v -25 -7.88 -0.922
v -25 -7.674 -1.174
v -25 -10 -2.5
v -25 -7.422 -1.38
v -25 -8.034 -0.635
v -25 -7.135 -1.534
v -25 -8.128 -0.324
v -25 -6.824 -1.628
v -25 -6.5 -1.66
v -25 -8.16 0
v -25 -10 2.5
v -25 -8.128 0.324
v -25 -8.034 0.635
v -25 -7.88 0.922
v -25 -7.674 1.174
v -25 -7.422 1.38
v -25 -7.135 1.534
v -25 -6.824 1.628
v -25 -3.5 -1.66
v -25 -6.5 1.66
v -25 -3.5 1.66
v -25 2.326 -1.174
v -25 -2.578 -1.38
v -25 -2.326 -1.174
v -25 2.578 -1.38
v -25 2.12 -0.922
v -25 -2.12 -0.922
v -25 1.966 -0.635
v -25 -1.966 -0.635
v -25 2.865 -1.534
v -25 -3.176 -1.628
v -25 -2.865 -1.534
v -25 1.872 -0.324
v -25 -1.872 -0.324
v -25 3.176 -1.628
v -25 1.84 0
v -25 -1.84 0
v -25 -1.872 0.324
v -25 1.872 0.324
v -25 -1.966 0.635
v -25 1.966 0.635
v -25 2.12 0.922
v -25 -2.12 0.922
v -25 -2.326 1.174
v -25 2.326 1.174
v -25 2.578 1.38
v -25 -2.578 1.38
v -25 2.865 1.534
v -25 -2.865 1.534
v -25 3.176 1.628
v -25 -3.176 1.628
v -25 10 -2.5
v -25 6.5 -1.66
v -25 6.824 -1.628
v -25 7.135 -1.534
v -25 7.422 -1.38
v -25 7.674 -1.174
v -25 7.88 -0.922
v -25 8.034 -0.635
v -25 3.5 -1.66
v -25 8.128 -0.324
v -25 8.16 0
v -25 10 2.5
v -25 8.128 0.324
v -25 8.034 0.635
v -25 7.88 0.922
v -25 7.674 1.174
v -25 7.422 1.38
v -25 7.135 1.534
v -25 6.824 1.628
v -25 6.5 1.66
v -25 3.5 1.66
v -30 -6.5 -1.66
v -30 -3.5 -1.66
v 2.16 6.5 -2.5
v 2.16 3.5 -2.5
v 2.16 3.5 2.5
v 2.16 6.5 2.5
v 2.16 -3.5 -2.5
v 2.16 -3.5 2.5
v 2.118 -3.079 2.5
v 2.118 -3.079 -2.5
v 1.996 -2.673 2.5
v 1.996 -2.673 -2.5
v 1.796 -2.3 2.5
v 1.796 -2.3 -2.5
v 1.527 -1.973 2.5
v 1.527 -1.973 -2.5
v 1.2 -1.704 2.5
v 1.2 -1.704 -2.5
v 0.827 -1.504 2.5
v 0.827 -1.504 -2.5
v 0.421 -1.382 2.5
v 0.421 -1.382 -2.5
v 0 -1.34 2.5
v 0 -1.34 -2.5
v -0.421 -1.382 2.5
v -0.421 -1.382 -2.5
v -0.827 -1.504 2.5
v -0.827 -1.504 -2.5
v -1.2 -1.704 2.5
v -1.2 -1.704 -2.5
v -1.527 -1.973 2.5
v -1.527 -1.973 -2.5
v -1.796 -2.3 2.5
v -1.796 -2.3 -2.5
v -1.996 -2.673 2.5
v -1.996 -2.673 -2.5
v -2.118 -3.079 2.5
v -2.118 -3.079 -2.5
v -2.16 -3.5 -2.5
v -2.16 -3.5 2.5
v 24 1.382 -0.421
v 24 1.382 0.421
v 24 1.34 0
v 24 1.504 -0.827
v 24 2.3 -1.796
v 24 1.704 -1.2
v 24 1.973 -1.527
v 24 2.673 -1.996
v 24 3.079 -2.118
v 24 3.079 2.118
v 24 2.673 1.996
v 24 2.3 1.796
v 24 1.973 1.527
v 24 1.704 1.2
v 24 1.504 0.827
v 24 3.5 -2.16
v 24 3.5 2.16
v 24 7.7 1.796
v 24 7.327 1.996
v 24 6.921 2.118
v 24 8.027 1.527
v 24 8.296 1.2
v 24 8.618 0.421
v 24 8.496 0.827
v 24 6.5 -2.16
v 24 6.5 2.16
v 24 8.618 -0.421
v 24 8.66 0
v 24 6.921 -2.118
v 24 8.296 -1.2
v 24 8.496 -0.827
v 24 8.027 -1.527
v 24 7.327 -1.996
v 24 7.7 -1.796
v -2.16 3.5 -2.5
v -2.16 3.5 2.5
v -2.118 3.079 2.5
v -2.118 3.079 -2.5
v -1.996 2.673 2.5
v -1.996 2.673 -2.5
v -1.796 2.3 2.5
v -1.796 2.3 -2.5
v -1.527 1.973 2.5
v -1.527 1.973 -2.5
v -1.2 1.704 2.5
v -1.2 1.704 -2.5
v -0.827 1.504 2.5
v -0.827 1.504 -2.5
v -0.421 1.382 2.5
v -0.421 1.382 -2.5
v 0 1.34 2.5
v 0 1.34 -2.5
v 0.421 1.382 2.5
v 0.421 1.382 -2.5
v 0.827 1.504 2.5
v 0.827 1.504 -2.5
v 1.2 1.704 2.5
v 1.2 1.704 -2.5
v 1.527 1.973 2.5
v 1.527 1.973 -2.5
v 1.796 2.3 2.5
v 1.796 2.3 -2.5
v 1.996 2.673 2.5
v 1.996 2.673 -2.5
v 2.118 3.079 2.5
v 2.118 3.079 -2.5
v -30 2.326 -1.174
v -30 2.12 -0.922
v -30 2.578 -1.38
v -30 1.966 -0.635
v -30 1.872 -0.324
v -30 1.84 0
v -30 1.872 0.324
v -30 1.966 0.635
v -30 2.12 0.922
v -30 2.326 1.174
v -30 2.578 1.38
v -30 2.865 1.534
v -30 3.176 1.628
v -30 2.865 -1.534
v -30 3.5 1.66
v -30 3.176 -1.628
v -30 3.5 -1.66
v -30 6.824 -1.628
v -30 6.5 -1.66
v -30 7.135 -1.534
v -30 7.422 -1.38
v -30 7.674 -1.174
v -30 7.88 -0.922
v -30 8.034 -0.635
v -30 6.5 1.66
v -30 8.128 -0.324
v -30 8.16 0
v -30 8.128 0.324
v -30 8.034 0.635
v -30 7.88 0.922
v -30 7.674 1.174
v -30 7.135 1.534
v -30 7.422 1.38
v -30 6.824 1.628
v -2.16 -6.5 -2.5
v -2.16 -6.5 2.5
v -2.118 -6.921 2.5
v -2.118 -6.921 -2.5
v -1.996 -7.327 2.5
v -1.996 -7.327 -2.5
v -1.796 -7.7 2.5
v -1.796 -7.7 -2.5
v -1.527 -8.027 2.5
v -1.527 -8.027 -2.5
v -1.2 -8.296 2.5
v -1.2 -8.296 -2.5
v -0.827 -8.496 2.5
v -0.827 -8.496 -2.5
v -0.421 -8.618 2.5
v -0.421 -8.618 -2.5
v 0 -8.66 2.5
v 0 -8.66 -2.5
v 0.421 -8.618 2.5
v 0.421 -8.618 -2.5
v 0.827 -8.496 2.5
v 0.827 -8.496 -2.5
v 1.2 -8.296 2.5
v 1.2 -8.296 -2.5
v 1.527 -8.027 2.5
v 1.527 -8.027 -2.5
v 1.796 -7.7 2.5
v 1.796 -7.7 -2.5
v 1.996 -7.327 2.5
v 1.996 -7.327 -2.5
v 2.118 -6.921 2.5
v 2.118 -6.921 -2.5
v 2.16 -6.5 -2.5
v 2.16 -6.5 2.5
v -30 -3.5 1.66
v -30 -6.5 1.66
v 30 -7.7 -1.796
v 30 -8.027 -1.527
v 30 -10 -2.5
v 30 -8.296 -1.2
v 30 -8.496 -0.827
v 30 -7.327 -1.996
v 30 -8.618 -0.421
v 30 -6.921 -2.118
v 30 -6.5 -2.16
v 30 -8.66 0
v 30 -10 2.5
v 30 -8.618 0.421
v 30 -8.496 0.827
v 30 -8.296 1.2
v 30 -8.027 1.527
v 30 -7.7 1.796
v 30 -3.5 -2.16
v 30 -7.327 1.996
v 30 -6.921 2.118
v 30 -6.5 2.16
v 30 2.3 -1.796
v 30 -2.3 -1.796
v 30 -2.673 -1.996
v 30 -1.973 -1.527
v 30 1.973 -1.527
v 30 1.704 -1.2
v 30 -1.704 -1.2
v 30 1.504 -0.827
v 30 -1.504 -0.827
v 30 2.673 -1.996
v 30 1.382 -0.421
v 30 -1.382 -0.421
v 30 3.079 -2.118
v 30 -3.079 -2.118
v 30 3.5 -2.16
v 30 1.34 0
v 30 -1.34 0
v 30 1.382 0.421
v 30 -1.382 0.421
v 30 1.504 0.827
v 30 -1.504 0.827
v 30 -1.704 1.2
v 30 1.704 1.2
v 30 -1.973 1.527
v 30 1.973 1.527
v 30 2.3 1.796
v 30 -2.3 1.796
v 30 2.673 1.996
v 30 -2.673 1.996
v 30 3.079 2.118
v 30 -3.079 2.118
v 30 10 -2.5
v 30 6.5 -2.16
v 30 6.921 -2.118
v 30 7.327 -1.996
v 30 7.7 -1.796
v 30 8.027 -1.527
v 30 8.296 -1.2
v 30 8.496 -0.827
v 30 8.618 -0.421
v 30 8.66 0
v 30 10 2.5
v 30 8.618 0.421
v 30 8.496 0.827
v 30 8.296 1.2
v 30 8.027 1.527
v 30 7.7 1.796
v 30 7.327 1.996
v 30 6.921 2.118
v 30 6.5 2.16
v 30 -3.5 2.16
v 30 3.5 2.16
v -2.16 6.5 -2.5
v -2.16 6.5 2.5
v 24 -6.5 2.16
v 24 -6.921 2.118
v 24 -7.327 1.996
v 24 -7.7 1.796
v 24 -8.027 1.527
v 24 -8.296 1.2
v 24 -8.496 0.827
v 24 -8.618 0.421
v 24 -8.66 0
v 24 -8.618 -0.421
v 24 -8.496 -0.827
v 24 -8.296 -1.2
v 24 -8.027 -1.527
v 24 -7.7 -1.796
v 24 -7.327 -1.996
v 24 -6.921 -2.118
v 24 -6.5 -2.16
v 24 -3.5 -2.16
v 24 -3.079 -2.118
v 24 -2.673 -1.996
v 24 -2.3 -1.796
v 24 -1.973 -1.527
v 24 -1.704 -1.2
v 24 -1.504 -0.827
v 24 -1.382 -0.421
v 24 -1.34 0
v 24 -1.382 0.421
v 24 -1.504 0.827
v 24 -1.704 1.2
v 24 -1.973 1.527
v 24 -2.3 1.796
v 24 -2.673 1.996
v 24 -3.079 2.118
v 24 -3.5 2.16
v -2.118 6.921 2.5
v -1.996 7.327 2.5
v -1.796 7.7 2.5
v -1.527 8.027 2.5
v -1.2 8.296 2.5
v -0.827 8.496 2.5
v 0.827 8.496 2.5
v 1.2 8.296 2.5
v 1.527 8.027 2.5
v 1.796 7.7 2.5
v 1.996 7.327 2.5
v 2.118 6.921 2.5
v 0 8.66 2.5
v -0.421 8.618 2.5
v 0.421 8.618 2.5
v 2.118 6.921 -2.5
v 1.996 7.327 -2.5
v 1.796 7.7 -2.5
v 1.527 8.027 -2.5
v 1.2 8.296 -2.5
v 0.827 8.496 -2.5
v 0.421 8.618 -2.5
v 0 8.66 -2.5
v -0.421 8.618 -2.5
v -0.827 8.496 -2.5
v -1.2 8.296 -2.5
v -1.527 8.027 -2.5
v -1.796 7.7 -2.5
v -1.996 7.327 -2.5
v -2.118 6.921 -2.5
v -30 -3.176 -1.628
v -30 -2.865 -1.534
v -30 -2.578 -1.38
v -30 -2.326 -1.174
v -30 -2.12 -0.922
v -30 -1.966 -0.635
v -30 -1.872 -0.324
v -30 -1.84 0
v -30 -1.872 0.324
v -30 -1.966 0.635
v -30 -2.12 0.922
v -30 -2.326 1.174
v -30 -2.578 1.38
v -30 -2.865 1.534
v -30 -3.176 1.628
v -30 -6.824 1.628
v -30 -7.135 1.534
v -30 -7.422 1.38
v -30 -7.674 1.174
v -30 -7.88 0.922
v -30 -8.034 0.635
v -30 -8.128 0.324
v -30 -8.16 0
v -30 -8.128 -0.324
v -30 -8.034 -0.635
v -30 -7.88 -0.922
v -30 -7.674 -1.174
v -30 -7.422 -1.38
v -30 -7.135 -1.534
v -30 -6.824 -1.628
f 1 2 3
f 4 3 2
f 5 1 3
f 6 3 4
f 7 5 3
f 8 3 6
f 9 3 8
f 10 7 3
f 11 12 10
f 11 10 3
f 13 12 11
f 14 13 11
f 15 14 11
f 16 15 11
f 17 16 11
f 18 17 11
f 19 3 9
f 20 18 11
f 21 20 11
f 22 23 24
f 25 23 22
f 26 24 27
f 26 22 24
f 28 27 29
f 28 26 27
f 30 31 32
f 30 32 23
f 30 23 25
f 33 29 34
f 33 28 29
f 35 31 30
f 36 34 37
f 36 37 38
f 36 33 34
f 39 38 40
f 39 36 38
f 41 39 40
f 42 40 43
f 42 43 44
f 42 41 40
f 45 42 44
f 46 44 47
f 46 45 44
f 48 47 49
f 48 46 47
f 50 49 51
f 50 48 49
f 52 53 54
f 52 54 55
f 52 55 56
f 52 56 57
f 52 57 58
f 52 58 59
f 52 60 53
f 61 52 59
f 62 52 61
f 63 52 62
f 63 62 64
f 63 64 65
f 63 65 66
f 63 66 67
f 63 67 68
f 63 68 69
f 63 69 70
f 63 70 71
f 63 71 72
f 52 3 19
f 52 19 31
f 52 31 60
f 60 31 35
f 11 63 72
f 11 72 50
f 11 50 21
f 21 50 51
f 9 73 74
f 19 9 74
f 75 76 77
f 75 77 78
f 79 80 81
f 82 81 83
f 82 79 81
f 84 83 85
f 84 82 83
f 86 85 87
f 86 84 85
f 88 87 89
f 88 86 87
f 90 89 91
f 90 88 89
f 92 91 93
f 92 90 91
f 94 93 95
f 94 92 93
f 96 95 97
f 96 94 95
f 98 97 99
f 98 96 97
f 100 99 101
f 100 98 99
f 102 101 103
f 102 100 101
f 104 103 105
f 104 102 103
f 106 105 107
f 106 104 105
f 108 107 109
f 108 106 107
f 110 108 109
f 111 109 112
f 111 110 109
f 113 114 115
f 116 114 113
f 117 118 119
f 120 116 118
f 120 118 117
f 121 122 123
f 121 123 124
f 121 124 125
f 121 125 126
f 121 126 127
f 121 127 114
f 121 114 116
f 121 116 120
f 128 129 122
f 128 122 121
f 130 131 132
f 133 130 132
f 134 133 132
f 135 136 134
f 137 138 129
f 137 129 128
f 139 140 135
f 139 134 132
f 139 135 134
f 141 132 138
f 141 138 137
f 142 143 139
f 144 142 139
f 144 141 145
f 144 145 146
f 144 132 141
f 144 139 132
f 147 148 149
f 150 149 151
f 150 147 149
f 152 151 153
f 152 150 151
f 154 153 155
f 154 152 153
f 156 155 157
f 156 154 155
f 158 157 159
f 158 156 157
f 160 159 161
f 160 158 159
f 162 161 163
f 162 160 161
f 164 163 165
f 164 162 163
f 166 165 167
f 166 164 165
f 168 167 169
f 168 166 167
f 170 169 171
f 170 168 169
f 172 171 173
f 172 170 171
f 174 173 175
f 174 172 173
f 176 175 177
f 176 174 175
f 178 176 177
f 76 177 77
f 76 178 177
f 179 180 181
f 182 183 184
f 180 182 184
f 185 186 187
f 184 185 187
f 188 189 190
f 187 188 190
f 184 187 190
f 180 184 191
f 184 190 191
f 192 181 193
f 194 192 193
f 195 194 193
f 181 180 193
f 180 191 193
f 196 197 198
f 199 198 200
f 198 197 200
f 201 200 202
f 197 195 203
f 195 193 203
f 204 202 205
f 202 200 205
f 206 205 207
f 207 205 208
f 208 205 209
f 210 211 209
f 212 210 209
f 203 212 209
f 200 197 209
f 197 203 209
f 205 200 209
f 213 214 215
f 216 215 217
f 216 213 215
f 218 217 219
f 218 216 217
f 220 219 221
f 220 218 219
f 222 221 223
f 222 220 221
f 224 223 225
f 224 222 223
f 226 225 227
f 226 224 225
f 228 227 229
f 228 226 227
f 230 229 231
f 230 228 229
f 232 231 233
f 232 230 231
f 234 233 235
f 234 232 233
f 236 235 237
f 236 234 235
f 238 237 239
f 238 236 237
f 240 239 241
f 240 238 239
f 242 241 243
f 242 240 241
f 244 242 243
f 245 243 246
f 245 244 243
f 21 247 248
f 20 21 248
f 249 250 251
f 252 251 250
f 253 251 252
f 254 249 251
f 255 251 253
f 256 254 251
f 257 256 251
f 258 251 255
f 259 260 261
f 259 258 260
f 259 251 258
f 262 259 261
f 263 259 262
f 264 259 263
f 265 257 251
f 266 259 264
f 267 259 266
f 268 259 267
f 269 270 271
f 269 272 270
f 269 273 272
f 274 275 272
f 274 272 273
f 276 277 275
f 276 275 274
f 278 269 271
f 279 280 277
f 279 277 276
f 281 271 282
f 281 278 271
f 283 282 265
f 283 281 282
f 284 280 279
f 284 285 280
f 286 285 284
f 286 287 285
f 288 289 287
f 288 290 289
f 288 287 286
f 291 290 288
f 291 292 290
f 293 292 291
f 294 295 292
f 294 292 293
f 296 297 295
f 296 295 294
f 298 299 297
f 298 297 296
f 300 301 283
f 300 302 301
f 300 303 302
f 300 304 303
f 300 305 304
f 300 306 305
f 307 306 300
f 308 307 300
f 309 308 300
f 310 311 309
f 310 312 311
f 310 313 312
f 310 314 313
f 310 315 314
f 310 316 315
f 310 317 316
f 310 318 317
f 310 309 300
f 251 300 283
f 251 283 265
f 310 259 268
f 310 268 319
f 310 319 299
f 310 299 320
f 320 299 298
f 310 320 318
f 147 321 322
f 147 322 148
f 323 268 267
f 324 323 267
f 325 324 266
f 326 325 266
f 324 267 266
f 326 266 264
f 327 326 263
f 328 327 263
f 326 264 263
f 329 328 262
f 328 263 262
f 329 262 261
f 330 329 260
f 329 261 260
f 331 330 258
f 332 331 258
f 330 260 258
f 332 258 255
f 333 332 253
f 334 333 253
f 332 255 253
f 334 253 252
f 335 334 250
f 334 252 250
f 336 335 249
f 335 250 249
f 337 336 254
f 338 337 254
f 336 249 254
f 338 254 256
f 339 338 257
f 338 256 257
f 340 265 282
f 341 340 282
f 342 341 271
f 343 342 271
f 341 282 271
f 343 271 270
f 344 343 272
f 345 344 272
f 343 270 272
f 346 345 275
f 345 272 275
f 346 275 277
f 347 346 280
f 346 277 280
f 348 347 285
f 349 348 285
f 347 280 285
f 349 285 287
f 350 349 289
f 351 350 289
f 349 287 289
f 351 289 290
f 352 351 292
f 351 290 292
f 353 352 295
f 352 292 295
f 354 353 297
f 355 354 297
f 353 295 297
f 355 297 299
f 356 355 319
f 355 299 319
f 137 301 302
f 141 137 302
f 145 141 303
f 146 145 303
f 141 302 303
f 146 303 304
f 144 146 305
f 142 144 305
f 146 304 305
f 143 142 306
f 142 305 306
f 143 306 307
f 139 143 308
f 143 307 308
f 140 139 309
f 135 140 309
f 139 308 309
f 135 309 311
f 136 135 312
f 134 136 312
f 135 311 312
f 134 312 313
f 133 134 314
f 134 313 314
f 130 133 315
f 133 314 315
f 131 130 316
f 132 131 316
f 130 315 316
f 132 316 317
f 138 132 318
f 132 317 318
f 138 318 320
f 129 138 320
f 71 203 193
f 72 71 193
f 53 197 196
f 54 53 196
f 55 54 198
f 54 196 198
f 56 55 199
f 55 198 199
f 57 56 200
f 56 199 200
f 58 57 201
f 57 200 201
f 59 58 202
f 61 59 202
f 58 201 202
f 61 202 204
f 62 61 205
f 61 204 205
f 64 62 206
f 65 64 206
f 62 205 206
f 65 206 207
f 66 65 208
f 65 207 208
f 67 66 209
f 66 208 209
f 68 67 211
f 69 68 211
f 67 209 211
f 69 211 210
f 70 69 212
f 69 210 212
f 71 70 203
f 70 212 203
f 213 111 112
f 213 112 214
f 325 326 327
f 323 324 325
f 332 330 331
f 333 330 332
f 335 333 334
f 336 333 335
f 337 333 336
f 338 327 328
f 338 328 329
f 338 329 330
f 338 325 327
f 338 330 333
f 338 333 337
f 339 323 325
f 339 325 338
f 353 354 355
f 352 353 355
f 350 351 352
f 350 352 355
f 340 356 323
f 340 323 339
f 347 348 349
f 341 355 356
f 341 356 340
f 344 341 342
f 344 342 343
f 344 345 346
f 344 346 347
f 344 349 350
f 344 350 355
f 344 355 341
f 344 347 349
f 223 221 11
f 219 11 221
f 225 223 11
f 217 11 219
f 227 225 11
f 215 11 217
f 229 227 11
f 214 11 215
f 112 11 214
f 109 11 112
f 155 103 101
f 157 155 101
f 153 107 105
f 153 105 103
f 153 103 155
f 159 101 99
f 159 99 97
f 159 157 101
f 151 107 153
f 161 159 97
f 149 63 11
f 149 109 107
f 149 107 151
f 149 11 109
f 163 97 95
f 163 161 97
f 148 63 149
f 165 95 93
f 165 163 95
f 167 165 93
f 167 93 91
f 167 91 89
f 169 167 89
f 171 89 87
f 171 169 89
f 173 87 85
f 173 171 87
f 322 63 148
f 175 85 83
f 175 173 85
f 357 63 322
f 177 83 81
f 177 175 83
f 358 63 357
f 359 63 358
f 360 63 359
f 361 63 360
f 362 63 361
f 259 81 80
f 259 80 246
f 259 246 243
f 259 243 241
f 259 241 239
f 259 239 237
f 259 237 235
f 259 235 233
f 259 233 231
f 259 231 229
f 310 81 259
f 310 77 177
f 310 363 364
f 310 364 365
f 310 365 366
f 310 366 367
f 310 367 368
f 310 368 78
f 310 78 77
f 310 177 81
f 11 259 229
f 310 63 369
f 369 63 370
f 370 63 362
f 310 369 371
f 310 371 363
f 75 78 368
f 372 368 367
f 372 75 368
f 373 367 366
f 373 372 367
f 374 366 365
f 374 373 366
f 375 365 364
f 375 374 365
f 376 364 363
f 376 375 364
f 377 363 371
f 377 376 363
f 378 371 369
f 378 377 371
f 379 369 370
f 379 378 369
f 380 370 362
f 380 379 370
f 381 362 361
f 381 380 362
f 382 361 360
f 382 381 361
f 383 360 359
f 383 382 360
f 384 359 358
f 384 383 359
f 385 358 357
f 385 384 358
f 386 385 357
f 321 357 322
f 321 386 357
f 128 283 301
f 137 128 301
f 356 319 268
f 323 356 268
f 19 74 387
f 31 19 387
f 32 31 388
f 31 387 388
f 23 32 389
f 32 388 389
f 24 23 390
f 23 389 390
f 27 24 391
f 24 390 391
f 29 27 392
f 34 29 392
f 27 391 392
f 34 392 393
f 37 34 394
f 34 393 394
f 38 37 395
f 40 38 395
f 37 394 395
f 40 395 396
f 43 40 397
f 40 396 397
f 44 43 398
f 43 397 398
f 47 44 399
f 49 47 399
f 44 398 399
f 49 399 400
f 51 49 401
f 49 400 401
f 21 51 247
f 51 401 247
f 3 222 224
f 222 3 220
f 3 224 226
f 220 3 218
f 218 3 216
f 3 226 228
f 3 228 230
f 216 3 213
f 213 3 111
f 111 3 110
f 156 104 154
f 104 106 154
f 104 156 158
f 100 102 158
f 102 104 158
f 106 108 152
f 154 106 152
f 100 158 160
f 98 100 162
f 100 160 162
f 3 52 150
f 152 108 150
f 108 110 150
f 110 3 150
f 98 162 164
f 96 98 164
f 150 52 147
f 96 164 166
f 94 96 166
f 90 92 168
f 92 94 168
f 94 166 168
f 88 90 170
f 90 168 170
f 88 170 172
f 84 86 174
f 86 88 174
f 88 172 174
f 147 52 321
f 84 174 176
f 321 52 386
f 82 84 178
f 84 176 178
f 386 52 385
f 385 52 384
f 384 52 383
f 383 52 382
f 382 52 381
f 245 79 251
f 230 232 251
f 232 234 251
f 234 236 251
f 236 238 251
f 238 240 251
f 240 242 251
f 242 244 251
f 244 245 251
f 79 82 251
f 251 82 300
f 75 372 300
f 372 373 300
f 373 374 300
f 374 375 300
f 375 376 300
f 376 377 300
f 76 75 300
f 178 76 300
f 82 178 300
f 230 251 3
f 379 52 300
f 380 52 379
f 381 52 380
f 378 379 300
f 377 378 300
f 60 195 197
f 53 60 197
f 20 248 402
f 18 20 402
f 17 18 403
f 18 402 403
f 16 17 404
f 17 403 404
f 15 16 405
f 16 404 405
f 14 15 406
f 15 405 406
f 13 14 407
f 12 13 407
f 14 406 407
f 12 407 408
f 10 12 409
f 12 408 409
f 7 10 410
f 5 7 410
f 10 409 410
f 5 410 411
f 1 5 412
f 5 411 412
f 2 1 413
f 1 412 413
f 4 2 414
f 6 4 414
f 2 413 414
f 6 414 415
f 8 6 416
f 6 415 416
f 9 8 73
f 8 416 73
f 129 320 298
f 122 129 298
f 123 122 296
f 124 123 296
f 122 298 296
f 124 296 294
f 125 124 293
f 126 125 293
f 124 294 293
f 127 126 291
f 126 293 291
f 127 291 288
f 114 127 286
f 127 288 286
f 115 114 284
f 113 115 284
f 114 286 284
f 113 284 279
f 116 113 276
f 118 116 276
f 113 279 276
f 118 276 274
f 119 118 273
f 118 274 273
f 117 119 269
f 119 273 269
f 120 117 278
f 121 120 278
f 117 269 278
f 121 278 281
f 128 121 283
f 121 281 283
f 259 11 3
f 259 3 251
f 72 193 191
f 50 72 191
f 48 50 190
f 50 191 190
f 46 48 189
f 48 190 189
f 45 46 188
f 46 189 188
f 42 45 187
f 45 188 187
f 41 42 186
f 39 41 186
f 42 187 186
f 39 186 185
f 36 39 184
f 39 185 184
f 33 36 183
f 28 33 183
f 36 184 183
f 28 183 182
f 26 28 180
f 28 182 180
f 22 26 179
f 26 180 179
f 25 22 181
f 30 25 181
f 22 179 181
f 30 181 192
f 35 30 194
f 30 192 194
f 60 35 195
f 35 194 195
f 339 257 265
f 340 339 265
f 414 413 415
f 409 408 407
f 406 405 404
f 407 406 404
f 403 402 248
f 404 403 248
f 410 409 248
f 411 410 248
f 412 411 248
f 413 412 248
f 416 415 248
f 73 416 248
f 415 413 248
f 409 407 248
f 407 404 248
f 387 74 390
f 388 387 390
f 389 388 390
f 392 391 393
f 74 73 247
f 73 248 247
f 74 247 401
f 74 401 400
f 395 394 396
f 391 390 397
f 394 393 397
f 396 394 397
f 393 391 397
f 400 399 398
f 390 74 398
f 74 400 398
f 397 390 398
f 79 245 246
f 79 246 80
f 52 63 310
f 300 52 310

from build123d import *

# Parameters (mm, degrees)
SKETCH1_W           = 60
SKETCH1_H           = 20
BOSS_EXTRUDE1_DEPTH = 2.5
SKETCH2_W           = 5
SKETCH2_H           = 20
CUT_EXTRUDE1_DEPTH  = 5
CUT_EXTRUDE2_DEPTH  = 6
CUT_EXTRUDE3_DEPTH  = 6


with BuildPart() as part:
    # Sketch1 → Boss-Extrude1 (new, symmetric)
    with BuildSketch(Plane.XY):
        Rectangle(SKETCH1_W, SKETCH1_H)
    extrude(amount=BOSS_EXTRUDE1_DEPTH, both=True)

    # Sketch2 → Cut-Extrude1 (cut)
    with BuildSketch(Plane.ZY.offset(30)):
        Rectangle(SKETCH2_W, SKETCH2_H)
        with BuildLine():
            Line((1.66, 6.5), (1.66, 3.5))
            ThreePointArc((1.66, 3.5), (0, 1.84), (-1.66, 3.5))
            Line((-1.66, 3.5), (-1.66, 6.5))
            ThreePointArc((-1.66, 6.5), (0, 8.16), (1.66, 6.5))
        make_face(mode=Mode.SUBTRACT)
        with BuildLine():
            Line((1.66, -3.5), (1.66, -6.5))
            ThreePointArc((1.66, -6.5), (0, -8.16), (-1.66, -6.5))
            Line((-1.66, -6.5), (-1.66, -3.5))
            ThreePointArc((-1.66, -3.5), (0, -1.84), (1.66, -3.5))
        make_face(mode=Mode.SUBTRACT)
    extrude(amount=-CUT_EXTRUDE1_DEPTH, mode=Mode.SUBTRACT)

    # Sketch3 → Cut-Extrude2 (cut)
    with BuildSketch(Plane(origin=(30, 0, 0), x_dir=(0, 0, -1), z_dir=(1, 0, 0))):
        with BuildLine():
            Line((2.16, 3.5), (2.16, 6.5))
            ThreePointArc((2.16, 6.5), (0, 8.66), (-2.16, 6.5))
            Line((-2.16, 6.5), (-2.16, 3.5))
            ThreePointArc((-2.16, 3.5), (0, 1.34), (2.16, 3.5))
        make_face()
        with BuildLine():
            Line((2.16, -6.5), (2.16, -3.5))
            ThreePointArc((2.16, -3.5), (0, -1.34), (-2.16, -3.5))
            Line((-2.16, -3.5), (-2.16, -6.5))
            ThreePointArc((-2.16, -6.5), (0, -8.66), (2.16, -6.5))
        make_face()
    extrude(amount=-CUT_EXTRUDE2_DEPTH, mode=Mode.SUBTRACT)

    # Sketch4 → Cut-Extrude3 (cut)
    with BuildSketch(Plane(origin=(0, 0, -2.5), x_dir=(-1, 0, 0), z_dir=(0, 0, -1))):
        with BuildLine():
            Line((2.16, 6.5), (2.16, 3.5))
            ThreePointArc((2.16, 3.5), (0, 1.34), (-2.16, 3.5))
            Line((-2.16, 3.5), (-2.16, 6.5))
            ThreePointArc((-2.16, 6.5), (0, 8.66), (2.16, 6.5))
        make_face()
        with BuildLine():
            Line((-2.16, -6.5), (-2.16, -3.5))
            ThreePointArc((-2.16, -3.5), (0, -1.34), (2.16, -3.5))
            Line((2.16, -3.5), (2.16, -6.5))
            ThreePointArc((2.16, -6.5), (0, -8.66), (-2.16, -6.5))
        make_face()
    extrude(amount=-CUT_EXTRUDE3_DEPTH, mode=Mode.SUBTRACT)


solid = part.part
